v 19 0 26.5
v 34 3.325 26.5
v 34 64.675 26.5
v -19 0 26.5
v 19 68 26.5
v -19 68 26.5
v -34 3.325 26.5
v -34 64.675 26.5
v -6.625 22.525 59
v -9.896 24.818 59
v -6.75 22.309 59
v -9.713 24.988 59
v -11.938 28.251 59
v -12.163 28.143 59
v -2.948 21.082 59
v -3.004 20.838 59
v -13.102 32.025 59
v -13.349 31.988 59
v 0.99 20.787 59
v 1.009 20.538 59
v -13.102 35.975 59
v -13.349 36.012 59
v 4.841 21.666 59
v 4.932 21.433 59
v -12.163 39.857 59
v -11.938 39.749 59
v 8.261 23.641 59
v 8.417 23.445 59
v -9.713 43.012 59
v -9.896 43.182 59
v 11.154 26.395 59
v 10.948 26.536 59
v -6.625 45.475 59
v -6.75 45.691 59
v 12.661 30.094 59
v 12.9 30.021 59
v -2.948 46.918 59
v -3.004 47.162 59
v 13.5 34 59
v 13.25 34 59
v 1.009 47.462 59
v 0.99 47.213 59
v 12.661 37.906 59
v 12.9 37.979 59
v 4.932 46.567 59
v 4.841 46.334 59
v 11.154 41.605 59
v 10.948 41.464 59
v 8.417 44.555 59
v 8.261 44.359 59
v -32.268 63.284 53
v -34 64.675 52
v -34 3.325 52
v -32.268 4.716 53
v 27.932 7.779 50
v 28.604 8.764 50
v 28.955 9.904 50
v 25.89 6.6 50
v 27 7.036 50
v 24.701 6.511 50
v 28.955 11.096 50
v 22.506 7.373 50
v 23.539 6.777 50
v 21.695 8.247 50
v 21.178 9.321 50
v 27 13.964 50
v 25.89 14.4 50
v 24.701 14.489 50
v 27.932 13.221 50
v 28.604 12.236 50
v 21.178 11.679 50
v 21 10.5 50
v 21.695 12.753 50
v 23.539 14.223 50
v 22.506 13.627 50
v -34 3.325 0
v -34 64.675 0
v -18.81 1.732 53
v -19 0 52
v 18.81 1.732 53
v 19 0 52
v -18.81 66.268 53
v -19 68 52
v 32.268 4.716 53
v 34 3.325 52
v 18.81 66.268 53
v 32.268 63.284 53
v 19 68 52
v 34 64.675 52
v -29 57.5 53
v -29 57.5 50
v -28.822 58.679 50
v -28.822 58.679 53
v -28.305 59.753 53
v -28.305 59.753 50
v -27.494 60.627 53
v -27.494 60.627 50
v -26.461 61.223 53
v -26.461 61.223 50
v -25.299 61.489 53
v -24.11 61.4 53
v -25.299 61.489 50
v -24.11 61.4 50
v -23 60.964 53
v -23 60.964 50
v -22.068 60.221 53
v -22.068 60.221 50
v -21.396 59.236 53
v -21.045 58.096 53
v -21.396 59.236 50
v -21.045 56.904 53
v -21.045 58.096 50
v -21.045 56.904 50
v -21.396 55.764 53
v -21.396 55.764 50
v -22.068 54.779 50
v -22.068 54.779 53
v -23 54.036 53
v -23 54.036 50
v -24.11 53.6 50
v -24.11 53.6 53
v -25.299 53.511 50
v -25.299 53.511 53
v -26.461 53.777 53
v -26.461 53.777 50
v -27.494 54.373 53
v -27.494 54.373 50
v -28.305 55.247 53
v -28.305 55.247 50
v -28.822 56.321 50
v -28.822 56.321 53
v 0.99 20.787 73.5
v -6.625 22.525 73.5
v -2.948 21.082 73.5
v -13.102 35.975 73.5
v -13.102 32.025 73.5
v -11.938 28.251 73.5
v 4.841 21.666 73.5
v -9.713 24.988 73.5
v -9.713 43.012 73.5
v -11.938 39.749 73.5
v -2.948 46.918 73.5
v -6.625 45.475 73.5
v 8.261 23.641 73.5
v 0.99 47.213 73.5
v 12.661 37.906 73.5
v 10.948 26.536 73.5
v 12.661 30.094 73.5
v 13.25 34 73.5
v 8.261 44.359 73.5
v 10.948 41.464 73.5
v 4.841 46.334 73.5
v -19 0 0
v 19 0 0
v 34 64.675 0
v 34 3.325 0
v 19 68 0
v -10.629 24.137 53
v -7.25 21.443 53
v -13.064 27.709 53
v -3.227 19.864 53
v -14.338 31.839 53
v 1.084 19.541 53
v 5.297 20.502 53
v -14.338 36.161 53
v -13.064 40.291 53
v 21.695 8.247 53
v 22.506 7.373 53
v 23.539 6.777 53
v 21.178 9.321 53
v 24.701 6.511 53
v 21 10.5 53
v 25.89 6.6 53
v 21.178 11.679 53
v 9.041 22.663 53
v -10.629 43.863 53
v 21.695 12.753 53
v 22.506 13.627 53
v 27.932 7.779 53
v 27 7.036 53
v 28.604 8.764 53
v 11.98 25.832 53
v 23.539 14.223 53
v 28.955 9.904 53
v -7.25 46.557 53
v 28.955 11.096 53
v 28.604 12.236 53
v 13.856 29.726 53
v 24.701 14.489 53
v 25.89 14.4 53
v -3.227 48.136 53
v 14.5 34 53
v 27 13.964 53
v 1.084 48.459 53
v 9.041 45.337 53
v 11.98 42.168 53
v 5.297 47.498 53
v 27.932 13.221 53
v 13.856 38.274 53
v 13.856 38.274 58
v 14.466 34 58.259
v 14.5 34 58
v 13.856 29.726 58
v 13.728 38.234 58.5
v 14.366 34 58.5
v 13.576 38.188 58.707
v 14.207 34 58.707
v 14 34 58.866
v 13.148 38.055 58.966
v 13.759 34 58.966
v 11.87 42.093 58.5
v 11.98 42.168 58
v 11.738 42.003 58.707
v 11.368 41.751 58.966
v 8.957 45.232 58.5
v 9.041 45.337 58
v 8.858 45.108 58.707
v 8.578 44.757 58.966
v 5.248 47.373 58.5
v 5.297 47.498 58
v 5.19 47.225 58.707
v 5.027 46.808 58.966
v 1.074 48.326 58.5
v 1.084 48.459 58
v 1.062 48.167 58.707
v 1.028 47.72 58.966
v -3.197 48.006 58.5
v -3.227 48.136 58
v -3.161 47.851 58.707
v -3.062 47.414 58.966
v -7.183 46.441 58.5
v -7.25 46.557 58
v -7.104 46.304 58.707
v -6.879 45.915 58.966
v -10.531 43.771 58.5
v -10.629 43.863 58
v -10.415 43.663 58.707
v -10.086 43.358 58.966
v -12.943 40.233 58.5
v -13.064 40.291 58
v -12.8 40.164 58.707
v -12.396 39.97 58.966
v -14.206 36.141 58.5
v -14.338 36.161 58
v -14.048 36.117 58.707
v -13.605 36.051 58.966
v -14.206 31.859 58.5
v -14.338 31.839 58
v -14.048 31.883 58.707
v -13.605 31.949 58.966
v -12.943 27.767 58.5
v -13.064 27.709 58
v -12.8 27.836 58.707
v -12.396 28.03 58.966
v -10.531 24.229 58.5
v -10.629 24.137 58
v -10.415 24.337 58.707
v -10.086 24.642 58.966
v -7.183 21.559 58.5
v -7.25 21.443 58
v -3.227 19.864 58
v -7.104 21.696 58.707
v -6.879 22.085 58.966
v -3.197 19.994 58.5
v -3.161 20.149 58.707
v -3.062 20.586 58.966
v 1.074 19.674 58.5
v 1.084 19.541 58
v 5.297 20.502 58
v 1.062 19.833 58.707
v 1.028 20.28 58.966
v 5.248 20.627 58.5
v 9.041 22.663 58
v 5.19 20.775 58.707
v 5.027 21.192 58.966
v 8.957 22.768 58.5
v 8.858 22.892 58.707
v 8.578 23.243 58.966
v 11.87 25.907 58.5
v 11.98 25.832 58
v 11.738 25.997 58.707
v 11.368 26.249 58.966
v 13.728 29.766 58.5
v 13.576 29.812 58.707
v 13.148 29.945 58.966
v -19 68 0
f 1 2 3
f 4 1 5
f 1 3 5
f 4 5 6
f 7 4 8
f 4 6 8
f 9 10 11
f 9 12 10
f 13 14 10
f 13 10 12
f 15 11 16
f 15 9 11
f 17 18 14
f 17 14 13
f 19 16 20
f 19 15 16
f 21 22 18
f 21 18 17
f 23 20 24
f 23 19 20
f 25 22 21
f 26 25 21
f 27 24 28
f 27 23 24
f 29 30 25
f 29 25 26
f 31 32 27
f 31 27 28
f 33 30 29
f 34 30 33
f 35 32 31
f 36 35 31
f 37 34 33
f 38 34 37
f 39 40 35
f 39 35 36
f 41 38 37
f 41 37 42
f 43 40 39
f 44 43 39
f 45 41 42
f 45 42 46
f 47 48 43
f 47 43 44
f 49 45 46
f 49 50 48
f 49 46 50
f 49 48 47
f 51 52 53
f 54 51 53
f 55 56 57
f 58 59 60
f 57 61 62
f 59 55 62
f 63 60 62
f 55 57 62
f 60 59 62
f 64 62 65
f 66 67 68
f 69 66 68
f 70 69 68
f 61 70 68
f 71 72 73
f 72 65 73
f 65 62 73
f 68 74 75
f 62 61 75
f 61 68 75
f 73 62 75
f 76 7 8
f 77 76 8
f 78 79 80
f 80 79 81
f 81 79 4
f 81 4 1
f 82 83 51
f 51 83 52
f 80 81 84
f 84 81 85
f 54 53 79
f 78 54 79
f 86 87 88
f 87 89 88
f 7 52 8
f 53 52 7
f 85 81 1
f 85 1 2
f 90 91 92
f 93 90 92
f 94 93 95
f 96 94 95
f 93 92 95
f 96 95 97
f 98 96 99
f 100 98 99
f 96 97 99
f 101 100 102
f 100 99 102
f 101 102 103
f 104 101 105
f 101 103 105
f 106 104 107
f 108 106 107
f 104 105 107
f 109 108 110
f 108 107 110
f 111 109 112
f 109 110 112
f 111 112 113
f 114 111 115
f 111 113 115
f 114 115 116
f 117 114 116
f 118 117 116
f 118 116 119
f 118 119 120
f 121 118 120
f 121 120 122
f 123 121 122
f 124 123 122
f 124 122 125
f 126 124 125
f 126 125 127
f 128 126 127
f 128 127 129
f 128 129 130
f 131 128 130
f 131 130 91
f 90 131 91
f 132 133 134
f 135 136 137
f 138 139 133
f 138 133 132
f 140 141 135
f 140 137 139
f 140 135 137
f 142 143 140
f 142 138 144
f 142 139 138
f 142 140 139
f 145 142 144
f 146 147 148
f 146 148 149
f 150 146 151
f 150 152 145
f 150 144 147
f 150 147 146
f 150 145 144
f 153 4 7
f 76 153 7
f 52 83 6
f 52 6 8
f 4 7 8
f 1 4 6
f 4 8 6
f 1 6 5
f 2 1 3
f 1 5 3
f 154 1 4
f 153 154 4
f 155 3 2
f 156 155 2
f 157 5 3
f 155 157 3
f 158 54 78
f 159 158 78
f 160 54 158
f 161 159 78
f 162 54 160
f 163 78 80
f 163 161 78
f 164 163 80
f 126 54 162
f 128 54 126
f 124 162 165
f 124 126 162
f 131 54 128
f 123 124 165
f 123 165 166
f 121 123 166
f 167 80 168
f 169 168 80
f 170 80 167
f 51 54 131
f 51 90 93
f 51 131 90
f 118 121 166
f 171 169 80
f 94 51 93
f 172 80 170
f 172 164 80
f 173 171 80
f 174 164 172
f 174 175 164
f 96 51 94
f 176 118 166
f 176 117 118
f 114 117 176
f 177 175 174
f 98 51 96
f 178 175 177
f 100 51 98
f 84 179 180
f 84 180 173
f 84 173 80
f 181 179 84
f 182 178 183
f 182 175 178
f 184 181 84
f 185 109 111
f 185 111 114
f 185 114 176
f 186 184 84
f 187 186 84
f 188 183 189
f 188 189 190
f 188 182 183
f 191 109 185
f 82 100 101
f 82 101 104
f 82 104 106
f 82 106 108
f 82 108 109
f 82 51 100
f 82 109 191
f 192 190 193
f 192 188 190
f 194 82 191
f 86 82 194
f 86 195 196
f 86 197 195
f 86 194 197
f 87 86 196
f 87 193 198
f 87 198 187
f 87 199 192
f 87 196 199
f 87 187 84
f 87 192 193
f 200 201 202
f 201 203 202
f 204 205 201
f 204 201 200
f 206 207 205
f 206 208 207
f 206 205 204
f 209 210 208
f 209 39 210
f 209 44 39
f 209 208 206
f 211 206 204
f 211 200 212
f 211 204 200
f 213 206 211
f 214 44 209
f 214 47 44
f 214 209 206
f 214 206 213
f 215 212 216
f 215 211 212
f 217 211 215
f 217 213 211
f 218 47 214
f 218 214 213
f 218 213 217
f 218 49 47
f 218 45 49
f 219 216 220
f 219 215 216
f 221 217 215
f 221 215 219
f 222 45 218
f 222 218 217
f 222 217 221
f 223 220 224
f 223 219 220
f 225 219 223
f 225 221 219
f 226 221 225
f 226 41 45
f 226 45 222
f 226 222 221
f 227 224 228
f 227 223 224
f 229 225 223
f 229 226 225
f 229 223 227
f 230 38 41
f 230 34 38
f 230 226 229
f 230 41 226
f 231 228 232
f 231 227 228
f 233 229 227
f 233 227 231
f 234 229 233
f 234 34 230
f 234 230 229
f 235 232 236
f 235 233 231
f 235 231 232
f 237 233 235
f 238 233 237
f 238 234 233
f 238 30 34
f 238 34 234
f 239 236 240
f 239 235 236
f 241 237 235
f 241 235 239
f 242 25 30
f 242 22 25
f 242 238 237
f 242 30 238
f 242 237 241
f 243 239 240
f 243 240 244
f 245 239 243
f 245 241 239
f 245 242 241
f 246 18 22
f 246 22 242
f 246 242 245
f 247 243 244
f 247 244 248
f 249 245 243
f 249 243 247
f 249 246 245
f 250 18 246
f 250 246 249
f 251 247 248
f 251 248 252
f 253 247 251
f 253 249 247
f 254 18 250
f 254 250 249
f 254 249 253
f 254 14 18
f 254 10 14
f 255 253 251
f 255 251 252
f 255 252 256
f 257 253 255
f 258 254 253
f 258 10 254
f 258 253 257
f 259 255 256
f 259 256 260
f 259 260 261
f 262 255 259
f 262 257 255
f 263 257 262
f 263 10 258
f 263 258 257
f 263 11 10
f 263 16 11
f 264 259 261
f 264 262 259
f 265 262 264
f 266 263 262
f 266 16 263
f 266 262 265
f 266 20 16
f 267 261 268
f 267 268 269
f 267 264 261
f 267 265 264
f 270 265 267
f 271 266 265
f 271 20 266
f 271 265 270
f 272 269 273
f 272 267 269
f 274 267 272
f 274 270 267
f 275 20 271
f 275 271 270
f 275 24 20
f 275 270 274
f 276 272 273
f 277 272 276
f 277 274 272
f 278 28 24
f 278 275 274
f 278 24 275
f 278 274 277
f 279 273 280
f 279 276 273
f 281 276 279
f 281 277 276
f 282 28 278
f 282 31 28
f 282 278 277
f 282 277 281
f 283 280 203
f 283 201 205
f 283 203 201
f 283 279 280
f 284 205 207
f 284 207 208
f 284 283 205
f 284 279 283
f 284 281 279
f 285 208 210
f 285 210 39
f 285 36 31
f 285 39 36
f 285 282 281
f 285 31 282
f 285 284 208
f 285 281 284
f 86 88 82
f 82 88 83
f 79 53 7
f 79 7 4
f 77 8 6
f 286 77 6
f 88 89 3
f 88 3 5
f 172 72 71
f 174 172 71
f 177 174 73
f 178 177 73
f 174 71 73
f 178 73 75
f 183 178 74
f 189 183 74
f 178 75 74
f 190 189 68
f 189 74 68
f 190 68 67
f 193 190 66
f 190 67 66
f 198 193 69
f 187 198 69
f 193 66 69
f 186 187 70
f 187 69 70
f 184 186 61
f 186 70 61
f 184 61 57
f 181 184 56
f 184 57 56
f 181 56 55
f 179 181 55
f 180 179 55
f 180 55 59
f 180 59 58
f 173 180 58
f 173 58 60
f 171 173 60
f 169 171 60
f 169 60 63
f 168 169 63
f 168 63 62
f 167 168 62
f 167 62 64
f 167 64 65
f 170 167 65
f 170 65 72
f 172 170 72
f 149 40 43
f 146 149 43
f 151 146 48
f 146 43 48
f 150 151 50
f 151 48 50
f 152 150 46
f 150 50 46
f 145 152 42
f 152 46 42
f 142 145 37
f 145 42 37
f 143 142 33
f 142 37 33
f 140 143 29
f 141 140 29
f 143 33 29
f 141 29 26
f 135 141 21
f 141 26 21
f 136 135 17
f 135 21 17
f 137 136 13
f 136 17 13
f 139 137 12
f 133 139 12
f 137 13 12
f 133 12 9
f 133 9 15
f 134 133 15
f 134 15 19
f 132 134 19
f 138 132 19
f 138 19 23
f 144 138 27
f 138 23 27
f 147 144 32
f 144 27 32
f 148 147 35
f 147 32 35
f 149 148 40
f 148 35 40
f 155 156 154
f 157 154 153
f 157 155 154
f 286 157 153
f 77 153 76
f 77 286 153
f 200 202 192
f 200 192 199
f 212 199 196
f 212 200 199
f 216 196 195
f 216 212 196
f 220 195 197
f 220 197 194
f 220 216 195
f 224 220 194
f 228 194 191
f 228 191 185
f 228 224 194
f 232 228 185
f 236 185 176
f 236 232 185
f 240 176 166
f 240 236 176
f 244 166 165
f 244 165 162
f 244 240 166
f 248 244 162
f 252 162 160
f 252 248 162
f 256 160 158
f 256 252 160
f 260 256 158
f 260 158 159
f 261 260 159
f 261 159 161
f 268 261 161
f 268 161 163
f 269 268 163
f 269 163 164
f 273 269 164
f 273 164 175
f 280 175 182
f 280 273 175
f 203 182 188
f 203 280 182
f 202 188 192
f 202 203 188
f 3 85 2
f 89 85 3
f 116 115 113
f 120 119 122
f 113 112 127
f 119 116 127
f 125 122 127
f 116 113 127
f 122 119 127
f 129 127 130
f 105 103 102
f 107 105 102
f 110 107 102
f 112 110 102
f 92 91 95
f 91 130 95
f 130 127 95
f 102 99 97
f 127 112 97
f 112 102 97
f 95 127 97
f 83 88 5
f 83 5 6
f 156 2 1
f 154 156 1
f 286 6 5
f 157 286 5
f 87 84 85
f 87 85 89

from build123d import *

# Parameters (mm, degrees)
SKETCH4_R                    = 14.5
BOSS_EXTRUDE3_DEPTH          = 6
BOSS_EXTRUDE4_DEPTH          = 26.5
F_8_0_8_DIAMETER_HOLE1_D     = 8
F_8_0_8_DIAMETER_HOLE1_DEPTH = 3
CHAMFER1_SIZE                = 1.732050808
CHAMFER1_SIZE2               = 1
CHAMFER2_SIZE                = 1
CHAMFER2_SIZE2               = 1.732050808
FILLET3_R                    = 1
BOSS_EXTRUDE7_DEPTH          = 26.5
SKETCH41_R                   = 13.25
BOSS_EXTRUDE8_DEPTH          = 14.5


with BuildPart() as part:
    # Sketch4 → Boss-Extrude3 (new body)
    with BuildSketch(Plane.XY.offset(59)):
        with Locations((0, 34)):
            Circle(SKETCH4_R)
    extrude(amount=-BOSS_EXTRUDE3_DEPTH)

    # Sketch5 → Boss-Extrude4 (add)
    with BuildSketch(Plane.XY.offset(53)):
        Polygon((-19, 0), (19, 0), (34, 3.32541994), (34, 64.67458006), (19, 68), (-19, 68), (-34, 64.67458006), (-34, 3.32541994), align=None)
    extrude(amount=-BOSS_EXTRUDE4_DEPTH)

    # Ø8.0 (8) Diameter Hole1
    with Locations(Plane.XY.offset(53)):
        with Locations((-25, 57.5), (25, 10.5)):
            Hole(F_8_0_8_DIAMETER_HOLE1_D / 2, depth=F_8_0_8_DIAMETER_HOLE1_DEPTH)

    # Chamfer1
    chamfer1_edges = [part.edges().sort_by_distance(p)[0] for p in [
        (26.5, 66.33729003, 53),
        (0, 68, 53),
        (-26.5, 66.33729003, 53),
        (-34, 34, 53),
        (-26.5, 1.66270997, 53),
        (0, 0, 53),
        (26.5, 1.66270997, 53),
    ]]
    chamfer1_side = [part.faces().sort_by_distance(p)[0] for p in [
        (0, 0.961665222, 53),
    ]]
    chamfer(chamfer1_edges, length=CHAMFER1_SIZE, length2=CHAMFER1_SIZE2, reference=chamfer1_side[0])

    # Chamfer2
    chamfer2_edges = [part.edges().sort_by_distance(p)[0] for p in [
        (34, 34, 53),
    ]]
    chamfer2_side = [part.faces().sort_by_distance(p)[0] for p in [
        (34, 34, 39.735889277),
    ]]
    chamfer(chamfer2_edges, length=CHAMFER2_SIZE, length2=CHAMFER2_SIZE2, reference=chamfer2_side[0])

    # Fillet3
    fillet3_edges = [part.edges().sort_by_distance(p)[0] for p in [
        (-14.5, 34, 59),
    ]]
    fillet(fillet3_edges, radius=FILLET3_R)

    # Sketch41 → Boss-Extrude8 (add)
    with BuildSketch(Plane.XY.offset(59)):
        with Locations((0, 34)):
            Circle(SKETCH41_R)
    extrude(amount=BOSS_EXTRUDE8_DEPTH)


with BuildPart() as body_2:
    # Sketch40 → Boss-Extrude7 (new body)
    with BuildSketch(Plane(origin=(0, 0, 26.5), x_dir=(-1, 0, 0), z_dir=(0, 0, -1))):
        Polygon((34, 3.32541994), (34, 64.67458006), (19, 68), (-19, 68), (-34, 64.67458006), (-34, 3.32541994), (-19, 0), (19, 0), align=None)
    extrude(amount=BOSS_EXTRUDE7_DEPTH)


solid = Compound([part.part, body_2.part])
